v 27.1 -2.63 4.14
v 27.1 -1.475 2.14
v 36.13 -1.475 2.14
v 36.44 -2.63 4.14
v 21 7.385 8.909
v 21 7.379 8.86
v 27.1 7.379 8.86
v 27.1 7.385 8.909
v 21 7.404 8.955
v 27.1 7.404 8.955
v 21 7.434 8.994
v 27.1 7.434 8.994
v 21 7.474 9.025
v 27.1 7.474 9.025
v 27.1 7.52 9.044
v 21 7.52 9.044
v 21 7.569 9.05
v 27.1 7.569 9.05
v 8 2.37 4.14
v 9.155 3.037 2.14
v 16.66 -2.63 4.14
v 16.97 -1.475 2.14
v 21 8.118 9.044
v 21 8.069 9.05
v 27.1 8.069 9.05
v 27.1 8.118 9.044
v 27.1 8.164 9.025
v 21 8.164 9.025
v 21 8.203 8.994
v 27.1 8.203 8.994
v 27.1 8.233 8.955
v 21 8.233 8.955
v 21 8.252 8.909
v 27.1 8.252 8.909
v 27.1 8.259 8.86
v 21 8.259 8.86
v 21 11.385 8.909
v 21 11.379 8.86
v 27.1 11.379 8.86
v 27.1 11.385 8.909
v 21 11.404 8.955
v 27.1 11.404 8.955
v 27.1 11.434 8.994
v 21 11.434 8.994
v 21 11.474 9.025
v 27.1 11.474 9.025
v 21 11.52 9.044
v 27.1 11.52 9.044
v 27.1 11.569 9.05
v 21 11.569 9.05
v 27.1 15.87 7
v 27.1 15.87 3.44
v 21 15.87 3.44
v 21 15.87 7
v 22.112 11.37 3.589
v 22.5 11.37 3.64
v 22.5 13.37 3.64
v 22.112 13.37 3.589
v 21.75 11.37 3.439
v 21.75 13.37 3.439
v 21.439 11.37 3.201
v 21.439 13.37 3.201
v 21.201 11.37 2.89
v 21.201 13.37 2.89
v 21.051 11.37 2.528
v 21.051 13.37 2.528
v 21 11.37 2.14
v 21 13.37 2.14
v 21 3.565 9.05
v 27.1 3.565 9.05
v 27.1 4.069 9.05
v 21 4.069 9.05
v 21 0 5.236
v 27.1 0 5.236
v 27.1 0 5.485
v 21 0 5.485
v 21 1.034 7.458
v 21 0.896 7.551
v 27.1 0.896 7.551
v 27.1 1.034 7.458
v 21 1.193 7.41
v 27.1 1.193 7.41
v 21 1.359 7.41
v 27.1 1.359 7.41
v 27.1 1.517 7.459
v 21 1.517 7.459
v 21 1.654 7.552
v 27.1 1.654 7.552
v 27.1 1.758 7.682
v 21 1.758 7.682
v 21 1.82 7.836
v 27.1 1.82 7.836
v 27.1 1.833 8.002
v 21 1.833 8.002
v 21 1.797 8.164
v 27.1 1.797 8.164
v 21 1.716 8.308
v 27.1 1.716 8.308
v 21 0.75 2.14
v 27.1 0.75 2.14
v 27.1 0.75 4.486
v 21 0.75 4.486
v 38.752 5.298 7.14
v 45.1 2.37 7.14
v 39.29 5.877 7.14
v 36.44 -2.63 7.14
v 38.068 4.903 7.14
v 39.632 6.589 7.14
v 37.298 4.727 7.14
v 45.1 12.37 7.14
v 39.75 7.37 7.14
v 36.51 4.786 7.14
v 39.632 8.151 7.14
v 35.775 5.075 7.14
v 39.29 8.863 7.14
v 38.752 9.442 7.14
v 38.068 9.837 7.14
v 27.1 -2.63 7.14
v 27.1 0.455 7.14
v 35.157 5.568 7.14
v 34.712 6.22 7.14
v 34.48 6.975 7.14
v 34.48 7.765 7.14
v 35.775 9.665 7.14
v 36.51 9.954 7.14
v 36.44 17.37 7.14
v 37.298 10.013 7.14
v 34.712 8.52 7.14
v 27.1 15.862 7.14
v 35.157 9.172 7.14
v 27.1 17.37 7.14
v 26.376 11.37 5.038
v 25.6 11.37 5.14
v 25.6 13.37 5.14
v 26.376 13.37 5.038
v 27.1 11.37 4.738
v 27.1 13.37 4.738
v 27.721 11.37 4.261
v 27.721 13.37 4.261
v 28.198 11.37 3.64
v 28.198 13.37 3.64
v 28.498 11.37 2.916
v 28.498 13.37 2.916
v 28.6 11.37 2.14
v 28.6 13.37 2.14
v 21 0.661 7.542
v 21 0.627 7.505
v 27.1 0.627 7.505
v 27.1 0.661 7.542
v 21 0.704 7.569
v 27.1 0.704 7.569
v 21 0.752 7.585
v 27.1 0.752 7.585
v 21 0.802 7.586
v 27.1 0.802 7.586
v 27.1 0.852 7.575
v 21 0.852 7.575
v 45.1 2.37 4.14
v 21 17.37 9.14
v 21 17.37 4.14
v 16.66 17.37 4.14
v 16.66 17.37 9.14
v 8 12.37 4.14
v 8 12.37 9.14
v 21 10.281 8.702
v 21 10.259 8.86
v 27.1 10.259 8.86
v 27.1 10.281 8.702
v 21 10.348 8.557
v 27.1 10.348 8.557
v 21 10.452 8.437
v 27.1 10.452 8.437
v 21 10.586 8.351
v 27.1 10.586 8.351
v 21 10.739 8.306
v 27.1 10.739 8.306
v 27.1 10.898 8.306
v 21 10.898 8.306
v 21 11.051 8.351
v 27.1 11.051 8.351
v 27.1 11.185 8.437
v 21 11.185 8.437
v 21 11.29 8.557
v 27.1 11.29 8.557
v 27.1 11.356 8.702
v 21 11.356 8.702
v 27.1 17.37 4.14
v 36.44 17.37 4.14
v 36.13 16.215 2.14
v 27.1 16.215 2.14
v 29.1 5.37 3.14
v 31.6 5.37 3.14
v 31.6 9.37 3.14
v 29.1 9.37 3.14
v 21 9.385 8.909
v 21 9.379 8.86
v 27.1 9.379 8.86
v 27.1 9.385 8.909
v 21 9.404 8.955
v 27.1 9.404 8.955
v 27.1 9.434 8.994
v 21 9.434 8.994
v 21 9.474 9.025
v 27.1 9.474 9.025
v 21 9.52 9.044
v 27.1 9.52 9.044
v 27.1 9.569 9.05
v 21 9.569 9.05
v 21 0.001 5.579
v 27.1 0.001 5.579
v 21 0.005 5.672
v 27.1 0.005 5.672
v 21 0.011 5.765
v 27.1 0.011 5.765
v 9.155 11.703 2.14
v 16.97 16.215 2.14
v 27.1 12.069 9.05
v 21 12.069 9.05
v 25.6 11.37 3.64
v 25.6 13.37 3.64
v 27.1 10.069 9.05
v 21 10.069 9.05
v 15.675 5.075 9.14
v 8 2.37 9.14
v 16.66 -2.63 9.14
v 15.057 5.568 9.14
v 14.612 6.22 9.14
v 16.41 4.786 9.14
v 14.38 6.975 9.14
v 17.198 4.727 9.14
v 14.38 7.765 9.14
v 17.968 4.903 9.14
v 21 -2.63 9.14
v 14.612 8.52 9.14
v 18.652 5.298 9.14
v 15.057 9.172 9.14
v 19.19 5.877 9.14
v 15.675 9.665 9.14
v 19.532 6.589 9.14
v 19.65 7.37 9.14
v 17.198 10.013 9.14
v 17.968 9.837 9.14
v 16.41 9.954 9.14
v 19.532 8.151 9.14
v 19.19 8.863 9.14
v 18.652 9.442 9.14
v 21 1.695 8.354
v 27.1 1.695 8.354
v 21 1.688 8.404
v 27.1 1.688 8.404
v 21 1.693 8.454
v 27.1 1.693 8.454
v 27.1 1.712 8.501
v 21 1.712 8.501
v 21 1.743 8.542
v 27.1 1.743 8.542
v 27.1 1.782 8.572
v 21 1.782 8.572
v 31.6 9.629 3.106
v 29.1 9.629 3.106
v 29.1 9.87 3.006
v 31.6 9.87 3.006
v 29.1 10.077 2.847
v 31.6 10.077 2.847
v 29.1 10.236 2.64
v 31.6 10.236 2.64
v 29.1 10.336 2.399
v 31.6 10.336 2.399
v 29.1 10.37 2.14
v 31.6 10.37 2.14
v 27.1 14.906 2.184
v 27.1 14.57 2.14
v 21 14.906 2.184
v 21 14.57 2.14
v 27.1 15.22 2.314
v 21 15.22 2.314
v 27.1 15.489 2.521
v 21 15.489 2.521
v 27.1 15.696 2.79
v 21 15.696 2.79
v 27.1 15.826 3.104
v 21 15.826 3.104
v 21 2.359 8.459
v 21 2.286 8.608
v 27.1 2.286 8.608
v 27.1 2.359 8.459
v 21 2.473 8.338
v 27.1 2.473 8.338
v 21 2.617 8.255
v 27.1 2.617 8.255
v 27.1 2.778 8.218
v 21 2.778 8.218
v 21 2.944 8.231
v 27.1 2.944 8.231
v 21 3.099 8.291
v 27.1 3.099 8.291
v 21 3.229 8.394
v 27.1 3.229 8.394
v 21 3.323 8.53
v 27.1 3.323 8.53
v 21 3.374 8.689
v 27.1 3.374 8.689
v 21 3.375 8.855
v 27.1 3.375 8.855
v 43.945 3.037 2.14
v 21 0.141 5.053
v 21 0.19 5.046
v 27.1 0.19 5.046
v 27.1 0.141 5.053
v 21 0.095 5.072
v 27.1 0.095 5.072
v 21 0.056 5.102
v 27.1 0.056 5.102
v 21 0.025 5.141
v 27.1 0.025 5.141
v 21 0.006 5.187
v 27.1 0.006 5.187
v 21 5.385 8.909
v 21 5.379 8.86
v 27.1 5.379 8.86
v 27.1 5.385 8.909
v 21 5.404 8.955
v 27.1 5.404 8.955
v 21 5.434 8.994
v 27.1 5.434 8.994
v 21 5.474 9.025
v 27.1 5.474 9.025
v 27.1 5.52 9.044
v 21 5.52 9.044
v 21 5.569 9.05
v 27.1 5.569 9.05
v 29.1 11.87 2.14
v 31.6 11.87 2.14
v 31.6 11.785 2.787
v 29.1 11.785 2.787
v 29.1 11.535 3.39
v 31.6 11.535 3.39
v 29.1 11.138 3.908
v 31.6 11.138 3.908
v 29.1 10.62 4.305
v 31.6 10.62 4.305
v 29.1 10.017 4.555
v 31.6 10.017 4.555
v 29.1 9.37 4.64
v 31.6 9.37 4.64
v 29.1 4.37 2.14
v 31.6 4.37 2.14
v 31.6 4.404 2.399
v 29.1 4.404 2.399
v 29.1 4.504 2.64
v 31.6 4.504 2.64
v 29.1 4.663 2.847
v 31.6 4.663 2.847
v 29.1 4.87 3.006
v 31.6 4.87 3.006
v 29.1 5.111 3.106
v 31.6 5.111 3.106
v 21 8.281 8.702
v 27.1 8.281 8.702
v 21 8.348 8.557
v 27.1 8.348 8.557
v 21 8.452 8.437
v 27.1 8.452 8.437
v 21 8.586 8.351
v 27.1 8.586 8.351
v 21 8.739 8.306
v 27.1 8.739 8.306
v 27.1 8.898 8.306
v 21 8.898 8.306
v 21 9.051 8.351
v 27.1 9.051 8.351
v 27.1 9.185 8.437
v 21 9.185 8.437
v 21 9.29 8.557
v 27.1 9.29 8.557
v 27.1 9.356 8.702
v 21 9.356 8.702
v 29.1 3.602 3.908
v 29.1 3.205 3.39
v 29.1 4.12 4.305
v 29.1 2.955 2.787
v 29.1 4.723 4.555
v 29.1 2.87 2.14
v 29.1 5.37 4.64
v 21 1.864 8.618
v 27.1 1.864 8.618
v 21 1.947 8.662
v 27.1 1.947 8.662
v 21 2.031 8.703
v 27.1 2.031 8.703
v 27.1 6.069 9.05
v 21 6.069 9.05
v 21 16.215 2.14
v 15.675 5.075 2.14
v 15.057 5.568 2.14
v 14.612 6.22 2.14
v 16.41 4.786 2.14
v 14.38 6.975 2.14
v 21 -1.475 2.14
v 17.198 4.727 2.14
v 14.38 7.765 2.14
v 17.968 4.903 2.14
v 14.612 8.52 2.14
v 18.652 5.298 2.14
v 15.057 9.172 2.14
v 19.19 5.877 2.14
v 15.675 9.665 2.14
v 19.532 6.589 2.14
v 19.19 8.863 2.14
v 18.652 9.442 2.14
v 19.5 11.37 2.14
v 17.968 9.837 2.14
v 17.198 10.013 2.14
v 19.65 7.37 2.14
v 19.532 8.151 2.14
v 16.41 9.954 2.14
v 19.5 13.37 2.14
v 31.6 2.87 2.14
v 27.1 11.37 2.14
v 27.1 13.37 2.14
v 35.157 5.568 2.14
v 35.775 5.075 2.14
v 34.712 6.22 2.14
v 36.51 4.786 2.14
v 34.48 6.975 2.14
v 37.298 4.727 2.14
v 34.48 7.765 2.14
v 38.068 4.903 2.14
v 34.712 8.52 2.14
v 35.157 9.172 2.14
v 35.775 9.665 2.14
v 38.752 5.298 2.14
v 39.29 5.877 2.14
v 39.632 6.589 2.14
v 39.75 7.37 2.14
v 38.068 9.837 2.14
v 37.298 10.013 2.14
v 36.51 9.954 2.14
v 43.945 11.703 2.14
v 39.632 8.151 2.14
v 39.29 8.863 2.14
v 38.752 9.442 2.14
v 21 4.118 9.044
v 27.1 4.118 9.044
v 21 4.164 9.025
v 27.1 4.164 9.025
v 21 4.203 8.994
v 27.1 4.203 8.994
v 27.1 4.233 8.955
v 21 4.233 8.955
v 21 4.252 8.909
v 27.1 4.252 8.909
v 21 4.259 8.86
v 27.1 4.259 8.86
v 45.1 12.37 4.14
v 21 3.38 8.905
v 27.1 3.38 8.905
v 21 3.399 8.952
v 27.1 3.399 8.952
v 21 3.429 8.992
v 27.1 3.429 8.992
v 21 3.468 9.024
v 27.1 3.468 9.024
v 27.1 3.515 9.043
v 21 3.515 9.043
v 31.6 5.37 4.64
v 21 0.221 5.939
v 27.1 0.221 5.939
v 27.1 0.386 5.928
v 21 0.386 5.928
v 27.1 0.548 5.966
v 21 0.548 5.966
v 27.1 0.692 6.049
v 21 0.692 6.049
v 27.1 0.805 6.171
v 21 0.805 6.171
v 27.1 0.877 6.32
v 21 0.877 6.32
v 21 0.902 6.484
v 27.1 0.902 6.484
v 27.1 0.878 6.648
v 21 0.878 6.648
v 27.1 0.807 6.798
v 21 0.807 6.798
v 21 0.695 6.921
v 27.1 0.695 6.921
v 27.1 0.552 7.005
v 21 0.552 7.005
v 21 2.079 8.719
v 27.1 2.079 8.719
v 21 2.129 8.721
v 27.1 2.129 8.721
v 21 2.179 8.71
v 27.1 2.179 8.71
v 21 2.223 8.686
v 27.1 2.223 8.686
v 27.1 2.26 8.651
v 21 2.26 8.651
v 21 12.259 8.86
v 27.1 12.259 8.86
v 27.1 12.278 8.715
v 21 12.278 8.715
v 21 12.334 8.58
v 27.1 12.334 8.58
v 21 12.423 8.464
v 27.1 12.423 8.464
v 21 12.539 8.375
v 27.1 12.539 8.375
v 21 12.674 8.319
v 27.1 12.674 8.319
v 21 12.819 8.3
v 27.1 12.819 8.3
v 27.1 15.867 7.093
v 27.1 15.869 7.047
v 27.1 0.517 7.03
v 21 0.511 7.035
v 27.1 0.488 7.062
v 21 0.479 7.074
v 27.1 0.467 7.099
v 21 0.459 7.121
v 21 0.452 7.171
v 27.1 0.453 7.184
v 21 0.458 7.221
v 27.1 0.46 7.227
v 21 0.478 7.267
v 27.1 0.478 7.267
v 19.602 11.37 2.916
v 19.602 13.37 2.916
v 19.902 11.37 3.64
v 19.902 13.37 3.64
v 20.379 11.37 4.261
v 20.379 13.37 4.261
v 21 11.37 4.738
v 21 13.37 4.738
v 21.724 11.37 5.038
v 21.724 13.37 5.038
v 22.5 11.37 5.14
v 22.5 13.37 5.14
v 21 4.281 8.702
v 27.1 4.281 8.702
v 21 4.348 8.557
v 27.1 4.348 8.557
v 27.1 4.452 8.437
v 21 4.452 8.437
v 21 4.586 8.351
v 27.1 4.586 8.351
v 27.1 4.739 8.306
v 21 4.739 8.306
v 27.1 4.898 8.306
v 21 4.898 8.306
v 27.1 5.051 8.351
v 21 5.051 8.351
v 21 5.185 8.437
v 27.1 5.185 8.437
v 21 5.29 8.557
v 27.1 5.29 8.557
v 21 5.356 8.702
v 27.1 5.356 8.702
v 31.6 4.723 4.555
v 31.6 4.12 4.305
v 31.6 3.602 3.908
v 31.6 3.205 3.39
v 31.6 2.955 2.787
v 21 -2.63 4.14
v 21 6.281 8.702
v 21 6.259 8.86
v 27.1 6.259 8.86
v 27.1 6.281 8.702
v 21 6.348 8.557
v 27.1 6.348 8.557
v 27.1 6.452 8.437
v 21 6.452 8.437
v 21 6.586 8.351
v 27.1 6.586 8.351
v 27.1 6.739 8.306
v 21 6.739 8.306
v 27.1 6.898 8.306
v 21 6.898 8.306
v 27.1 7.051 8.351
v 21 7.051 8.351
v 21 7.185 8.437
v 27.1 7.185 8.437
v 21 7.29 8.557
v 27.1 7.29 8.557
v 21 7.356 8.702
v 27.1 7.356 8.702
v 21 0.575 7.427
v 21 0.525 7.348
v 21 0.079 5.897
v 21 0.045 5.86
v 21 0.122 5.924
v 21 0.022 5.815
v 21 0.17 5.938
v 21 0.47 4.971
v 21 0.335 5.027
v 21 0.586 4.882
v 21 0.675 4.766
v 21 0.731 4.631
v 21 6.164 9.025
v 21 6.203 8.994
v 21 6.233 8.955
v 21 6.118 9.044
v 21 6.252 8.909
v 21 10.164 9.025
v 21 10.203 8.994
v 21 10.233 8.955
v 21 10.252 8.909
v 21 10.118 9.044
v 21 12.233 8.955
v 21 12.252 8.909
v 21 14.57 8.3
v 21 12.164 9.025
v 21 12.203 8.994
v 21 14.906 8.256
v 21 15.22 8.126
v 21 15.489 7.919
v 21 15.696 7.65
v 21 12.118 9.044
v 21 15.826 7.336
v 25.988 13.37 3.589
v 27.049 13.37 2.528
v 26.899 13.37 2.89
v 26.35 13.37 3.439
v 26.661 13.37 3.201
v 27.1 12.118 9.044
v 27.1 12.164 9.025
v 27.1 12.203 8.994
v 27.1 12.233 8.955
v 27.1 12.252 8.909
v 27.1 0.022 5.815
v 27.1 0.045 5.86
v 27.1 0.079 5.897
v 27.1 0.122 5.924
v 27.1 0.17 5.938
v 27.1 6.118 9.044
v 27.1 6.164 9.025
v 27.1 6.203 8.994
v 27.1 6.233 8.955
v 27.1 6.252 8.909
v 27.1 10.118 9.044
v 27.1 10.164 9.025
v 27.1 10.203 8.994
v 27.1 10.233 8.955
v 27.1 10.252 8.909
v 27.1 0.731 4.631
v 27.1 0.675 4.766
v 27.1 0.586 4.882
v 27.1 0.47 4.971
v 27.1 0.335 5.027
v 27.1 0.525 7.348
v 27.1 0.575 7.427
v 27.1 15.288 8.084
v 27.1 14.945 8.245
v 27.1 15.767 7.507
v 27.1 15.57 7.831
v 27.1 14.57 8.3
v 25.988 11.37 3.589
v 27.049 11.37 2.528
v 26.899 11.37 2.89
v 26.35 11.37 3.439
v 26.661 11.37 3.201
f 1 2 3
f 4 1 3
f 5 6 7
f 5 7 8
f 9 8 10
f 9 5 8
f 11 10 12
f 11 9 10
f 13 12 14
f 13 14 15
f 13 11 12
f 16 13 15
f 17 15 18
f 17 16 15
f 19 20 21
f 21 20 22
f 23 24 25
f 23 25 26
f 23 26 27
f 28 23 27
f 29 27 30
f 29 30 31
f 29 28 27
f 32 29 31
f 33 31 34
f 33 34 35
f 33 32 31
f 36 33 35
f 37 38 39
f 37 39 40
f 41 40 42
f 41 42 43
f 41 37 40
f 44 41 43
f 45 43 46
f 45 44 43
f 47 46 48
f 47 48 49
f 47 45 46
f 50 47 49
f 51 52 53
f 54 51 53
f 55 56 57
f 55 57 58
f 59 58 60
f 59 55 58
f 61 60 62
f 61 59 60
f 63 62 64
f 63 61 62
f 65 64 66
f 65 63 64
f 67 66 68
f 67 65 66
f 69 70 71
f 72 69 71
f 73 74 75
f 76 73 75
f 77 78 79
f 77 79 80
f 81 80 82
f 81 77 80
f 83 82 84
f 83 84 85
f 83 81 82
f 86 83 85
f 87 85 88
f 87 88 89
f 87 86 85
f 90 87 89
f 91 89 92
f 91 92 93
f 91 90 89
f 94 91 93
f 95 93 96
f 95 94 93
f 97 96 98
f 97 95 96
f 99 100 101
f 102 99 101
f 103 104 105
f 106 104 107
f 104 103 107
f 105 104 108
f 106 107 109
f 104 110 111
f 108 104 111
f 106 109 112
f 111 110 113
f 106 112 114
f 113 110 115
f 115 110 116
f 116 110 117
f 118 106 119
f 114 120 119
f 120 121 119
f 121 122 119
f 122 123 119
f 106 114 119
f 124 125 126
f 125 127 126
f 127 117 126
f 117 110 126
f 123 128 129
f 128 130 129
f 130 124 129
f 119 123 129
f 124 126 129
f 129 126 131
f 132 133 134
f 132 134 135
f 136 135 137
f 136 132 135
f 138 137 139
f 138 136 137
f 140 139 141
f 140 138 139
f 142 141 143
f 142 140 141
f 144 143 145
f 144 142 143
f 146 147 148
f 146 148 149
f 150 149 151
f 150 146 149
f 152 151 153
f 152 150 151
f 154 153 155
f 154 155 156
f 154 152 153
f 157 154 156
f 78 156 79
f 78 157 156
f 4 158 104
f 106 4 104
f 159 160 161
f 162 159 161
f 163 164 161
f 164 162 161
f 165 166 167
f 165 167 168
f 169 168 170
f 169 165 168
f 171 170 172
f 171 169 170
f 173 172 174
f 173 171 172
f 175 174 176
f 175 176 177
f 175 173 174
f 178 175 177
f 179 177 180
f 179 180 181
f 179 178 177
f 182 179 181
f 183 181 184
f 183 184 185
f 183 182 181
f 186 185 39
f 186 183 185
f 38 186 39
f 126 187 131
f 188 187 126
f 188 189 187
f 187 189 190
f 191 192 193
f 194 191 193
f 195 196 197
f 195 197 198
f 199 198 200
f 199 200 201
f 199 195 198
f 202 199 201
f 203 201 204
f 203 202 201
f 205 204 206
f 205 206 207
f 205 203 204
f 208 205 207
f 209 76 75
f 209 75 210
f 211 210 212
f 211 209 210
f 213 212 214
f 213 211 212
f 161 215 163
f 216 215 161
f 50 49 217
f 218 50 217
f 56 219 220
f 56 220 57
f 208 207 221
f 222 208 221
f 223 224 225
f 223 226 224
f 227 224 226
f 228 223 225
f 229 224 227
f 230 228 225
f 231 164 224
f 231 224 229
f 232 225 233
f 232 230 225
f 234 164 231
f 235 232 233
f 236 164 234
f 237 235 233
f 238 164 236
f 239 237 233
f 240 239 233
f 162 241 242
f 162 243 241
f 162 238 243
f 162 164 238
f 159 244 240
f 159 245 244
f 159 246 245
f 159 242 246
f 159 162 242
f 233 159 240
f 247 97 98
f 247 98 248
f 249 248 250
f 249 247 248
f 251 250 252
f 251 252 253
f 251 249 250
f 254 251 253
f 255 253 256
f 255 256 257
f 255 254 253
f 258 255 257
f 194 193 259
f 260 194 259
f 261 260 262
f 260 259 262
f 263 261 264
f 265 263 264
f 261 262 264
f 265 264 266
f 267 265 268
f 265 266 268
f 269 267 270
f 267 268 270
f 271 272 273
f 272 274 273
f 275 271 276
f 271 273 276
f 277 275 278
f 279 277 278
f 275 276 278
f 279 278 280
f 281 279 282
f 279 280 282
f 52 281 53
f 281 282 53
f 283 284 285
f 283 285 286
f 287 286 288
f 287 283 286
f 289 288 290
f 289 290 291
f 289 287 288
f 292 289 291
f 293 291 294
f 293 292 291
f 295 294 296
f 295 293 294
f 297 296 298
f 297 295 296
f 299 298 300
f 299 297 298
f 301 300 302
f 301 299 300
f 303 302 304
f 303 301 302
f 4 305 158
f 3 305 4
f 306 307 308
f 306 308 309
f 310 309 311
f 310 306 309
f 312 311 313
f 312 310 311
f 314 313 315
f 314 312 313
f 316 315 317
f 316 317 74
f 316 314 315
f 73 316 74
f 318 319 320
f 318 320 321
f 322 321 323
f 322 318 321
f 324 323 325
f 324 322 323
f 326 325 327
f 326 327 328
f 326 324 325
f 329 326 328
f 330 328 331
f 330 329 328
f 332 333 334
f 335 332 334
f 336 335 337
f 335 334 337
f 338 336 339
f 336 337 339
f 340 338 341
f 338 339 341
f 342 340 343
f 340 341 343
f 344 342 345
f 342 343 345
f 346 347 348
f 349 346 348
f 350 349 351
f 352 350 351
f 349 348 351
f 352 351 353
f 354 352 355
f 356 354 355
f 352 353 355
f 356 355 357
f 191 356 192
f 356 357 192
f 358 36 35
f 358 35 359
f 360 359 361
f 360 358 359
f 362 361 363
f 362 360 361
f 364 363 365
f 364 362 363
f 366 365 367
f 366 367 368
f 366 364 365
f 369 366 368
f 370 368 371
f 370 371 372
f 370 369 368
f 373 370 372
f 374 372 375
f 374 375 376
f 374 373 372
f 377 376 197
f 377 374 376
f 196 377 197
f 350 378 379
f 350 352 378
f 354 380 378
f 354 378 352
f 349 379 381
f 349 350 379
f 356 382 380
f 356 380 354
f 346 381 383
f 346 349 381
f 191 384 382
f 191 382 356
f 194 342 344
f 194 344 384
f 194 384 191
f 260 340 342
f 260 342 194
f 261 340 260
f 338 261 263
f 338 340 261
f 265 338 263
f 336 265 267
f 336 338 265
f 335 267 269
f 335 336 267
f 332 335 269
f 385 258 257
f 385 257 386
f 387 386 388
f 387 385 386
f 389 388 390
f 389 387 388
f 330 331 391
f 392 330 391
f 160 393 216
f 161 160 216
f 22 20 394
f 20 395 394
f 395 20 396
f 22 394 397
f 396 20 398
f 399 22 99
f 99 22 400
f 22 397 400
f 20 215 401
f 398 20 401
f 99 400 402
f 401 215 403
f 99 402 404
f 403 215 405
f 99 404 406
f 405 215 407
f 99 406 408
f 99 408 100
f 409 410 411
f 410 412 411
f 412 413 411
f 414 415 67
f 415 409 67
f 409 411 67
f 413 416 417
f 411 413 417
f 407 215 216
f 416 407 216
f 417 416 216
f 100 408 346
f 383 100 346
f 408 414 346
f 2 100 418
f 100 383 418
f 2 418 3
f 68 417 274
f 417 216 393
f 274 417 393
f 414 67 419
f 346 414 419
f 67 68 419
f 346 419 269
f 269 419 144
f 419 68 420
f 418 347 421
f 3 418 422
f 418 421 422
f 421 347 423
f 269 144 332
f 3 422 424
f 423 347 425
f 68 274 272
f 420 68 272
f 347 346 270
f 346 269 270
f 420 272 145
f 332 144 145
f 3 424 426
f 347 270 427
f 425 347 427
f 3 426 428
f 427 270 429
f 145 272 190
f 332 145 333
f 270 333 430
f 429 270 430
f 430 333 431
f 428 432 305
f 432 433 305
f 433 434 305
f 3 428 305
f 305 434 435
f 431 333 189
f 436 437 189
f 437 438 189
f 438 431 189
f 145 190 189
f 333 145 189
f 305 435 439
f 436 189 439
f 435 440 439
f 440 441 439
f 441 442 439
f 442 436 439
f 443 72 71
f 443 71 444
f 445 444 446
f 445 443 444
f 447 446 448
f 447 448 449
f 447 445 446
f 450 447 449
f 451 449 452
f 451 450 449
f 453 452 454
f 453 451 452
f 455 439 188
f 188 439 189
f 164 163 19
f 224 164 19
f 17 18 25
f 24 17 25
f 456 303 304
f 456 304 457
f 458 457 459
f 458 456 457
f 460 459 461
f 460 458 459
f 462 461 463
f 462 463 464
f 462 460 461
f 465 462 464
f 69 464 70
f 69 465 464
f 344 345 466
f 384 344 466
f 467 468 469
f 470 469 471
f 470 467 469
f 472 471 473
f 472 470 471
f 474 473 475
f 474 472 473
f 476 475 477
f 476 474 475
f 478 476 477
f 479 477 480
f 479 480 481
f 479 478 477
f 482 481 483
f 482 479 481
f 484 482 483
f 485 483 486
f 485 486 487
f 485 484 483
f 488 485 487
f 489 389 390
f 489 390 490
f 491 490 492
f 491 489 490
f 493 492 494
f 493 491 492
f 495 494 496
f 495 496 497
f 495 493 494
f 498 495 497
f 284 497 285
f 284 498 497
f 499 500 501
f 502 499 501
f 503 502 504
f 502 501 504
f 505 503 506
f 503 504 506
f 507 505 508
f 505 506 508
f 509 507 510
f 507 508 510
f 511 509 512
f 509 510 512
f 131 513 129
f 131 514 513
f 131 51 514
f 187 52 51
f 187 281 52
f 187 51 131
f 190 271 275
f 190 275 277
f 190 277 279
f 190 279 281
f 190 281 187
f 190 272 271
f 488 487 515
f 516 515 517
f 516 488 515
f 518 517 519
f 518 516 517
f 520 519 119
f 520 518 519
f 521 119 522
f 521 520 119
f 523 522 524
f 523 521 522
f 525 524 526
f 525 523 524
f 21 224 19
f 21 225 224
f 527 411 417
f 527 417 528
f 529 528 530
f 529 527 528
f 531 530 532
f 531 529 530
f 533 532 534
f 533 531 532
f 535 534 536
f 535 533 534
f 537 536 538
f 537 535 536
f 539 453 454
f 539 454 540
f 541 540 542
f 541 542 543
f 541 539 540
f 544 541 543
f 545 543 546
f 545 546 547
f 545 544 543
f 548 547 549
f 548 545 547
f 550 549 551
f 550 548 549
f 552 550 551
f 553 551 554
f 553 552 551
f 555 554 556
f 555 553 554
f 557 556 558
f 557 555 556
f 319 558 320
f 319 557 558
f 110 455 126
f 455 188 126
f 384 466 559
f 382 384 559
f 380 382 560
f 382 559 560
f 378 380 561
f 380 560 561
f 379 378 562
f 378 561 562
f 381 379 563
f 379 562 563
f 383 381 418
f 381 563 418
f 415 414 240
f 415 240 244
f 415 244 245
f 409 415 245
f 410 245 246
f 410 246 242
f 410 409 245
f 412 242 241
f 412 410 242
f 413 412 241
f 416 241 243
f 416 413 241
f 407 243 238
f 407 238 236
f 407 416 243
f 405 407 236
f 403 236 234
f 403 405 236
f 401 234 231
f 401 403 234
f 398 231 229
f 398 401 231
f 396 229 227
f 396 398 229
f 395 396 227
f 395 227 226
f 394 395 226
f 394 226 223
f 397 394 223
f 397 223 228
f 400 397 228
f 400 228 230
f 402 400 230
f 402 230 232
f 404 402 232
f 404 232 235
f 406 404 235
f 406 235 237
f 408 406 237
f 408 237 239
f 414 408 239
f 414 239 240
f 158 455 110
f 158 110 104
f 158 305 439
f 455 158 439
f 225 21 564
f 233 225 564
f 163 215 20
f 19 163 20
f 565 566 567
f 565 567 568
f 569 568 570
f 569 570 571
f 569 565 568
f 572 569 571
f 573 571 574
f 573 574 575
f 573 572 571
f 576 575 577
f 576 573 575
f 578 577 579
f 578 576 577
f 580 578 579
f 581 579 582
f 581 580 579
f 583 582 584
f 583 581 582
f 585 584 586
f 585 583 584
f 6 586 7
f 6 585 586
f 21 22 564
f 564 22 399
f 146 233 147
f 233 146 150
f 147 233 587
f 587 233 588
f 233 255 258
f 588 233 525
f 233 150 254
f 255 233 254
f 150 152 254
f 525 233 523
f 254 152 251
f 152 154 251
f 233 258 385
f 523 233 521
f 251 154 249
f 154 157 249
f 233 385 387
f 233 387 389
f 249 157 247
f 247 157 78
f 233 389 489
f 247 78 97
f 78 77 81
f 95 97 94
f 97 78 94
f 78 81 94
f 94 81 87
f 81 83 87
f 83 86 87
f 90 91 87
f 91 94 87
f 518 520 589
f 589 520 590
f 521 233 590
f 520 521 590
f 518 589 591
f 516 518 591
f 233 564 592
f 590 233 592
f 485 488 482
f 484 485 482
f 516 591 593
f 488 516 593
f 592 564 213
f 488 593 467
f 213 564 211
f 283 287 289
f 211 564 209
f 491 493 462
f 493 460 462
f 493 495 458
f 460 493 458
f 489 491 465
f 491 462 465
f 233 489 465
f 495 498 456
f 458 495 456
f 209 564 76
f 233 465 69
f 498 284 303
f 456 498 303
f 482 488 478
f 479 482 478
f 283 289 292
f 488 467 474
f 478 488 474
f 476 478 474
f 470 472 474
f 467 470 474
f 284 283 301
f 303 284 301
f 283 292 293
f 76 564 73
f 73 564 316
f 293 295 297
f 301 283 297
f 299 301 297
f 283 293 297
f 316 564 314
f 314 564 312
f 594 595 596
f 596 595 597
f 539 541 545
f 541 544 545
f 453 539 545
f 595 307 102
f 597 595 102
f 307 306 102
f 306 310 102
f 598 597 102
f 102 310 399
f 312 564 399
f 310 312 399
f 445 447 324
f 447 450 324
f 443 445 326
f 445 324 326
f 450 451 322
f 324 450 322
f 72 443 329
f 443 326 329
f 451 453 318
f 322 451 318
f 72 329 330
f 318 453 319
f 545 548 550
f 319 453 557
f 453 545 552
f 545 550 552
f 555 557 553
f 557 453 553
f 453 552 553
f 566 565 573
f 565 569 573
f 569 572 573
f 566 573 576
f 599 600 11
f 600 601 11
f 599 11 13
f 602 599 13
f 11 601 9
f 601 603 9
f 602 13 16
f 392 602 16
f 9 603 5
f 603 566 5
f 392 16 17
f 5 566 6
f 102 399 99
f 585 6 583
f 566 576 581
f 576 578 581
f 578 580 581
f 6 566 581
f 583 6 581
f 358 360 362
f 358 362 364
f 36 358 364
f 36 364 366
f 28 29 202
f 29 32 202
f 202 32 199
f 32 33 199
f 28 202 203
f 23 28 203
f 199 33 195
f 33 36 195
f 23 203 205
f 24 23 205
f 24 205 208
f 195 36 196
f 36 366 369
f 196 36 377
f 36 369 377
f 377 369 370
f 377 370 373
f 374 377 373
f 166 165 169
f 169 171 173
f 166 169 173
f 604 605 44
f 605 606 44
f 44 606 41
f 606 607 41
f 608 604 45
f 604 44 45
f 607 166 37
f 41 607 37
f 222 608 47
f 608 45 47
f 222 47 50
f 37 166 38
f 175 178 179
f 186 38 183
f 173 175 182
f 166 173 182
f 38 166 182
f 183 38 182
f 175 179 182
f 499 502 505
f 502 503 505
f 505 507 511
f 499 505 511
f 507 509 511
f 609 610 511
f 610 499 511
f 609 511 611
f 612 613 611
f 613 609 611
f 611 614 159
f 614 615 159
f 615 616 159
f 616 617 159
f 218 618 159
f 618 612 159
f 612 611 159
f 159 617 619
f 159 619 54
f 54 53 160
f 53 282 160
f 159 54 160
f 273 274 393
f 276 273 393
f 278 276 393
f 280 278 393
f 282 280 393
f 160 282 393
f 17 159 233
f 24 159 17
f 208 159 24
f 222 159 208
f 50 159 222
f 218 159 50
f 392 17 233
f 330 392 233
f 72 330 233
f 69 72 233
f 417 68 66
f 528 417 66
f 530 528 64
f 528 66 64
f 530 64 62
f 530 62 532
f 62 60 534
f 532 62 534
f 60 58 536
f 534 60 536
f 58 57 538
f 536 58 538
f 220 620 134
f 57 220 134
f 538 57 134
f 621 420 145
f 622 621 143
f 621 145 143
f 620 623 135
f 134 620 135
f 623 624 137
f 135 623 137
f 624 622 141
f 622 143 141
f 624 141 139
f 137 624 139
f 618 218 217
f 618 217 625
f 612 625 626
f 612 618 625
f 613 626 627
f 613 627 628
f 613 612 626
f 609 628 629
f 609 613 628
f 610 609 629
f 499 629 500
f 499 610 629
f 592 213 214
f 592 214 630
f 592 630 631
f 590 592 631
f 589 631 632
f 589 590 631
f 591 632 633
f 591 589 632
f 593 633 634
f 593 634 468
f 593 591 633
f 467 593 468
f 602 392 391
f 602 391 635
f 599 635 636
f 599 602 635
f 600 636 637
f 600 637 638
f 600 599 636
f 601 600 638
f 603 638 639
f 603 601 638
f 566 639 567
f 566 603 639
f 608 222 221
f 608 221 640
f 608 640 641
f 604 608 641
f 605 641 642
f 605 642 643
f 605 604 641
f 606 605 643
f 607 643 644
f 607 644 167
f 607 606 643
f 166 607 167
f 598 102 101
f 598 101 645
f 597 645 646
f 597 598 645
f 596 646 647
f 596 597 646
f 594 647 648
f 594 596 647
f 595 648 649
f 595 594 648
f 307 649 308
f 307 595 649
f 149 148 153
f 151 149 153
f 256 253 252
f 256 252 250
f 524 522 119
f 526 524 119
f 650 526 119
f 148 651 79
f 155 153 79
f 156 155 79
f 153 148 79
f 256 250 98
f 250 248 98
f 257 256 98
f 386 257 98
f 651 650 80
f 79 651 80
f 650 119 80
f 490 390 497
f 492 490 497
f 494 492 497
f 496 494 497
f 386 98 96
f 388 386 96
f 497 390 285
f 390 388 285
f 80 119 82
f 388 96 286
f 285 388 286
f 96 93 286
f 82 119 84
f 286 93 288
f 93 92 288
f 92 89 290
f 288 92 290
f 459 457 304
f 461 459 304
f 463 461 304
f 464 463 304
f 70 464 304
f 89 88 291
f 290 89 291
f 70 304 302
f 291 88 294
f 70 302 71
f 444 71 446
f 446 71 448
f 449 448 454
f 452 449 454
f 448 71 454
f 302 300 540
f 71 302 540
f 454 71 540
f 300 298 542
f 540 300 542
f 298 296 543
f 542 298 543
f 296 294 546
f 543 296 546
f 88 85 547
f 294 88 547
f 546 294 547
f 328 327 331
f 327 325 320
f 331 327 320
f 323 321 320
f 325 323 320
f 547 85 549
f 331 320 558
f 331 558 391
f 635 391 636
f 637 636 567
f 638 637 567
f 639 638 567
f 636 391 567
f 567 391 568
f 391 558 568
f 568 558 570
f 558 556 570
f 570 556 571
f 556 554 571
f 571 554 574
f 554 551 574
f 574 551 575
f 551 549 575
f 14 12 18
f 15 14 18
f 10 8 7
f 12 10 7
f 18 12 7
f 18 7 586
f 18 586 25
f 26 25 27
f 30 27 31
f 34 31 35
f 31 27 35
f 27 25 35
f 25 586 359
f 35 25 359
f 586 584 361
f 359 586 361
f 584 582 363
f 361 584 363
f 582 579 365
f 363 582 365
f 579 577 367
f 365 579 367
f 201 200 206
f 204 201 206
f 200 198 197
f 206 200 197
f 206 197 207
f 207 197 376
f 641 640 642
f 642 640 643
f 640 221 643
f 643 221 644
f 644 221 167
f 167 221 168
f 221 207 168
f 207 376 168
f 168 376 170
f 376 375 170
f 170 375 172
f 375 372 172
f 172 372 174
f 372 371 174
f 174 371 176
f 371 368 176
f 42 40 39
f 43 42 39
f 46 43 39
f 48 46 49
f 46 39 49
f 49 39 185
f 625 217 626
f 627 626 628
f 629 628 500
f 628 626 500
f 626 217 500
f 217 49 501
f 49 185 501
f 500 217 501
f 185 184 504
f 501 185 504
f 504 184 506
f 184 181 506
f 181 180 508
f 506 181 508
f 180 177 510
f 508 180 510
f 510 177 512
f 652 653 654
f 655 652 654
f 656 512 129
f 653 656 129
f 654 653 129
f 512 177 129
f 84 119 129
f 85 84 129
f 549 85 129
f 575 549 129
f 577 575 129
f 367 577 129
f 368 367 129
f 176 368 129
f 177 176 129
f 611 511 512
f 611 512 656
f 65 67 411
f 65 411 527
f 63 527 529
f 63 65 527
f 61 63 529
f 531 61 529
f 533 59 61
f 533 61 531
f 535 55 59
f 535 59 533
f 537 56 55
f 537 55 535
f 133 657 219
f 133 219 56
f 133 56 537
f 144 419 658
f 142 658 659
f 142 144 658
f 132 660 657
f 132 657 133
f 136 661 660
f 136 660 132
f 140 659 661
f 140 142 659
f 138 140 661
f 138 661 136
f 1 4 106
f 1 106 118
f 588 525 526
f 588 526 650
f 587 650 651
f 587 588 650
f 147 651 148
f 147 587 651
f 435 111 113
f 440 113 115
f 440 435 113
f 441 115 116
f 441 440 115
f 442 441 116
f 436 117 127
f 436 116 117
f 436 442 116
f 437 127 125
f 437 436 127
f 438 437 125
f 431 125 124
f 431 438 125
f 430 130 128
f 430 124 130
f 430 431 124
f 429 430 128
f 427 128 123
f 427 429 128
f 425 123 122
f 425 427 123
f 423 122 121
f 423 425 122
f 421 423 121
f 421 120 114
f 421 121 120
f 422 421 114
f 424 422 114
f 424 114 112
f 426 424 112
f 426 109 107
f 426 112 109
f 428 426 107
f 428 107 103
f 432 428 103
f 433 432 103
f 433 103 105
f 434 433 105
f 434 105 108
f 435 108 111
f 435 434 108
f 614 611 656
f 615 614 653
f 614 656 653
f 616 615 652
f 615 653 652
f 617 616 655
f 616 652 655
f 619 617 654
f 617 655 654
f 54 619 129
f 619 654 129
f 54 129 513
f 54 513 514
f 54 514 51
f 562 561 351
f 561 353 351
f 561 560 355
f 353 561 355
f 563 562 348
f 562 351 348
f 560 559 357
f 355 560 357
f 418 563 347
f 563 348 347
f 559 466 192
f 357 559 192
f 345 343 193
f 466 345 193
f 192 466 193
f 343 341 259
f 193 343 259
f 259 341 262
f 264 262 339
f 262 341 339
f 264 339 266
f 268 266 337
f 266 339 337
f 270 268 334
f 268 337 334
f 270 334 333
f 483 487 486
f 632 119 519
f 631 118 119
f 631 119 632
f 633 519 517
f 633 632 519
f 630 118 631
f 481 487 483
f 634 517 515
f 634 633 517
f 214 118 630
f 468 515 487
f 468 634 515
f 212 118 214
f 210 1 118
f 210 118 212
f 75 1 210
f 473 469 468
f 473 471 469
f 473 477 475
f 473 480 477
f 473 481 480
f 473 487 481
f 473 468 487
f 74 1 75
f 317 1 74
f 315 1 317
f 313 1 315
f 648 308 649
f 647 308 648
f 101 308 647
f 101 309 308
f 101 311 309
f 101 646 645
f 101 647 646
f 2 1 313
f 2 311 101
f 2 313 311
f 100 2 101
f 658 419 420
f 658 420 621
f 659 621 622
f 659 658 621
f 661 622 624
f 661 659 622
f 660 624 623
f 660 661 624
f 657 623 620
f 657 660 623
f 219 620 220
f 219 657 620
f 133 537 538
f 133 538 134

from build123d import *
from OCP.BRepFilletAPI import BRepFilletAPI_MakeChamfer

# Parameters (mm, degrees)
AUFSATZ_LINEAR_AUSTRAGEN1_DEPTH    = 6.1
SKIZZE1_W                          = 6
SKIZZE1_H                          = 15
AUFSATZ_LINEAR_AUSTRAGEN1_2_DEPTH  = 6.1
SKIZZE2_W                          = 6
SKIZZE2_H                          = 15
SCHNITT_LINEAR_AUSTRAGEN1_DEPTH    = 6.1
SKIZZE3_R                          = 2.65
AUFSATZ_LINEAR_AUSTRAGEN2_DEPTH    = 2.19
SCHNITT_LINEAR_AUSTRAGEN7_DEPTH    = 6.1
AUFSATZ_LINEAR_START               = 4.81
SKIZZE4_R                          = 2.65
AUFSATZ_LINEAR_AUSTRAGEN3_DEPTH    = 4.81
SKIZZE5_R                          = 2.65
AUFSATZ_LINEAR_AUSTRAGEN4_DEPTH    = 0.19
FASE1_SIZE                         = 5
FASE1_SIZE2                        = 8.660254038
FASE2_SIZE                         = 2
FASE2_SIZE2                        = 1.154700538
SCHNITT_LINEAR_START               = -14
SCHNITT_LINEAR_AUSTRAGEN8_DEPTH    = 2
SCHNITT_LINEAR_START_2             = -13.5
SCHNITT_LINEAR_AUSTRAGEN5_DEPTH    = 2.5
VERRUNDUNG1_R                      = 1.3
K_RPER_VERSCHIEBEN_KOPIEREN1_ANGLE = 90


with BuildPart() as part:
    # Skizze1 → Aufsatz-Linear austragen1 (new body)
    with BuildSketch(Plane.XY):
        with BuildLine():
            Line((-7.050000002, 7.568775844), (-7.050000002, 8.068775844))
            ThreePointArc((-7.050000002, 8.068775844), (-7.105649713, 8.203126132), (-7.240000002, 8.258775844))
            ThreePointArc((-7.240000002, 8.258775844), (-7.800000002, 8.818775844), (-7.240000002, 9.378775844))
            ThreePointArc((-7.240000002, 9.378775844), (-7.105649713, 9.434425555), (-7.050000002, 9.568775844))
            Line((-7.050000002, 9.568775844), (-7.050000002, 10.068775844))
            ThreePointArc((-7.050000002, 10.068775844), (-7.105649713, 10.203126132), (-7.240000002, 10.258775844))
            ThreePointArc((-7.240000002, 10.258775844), (-7.800000002, 10.818775844), (-7.240000002, 11.378775844))
            ThreePointArc((-7.240000002, 11.378775844), (-7.105649713, 11.434425555), (-7.050000002, 11.568775844))
            Line((-7.050000002, 11.568775844), (-7.050000002, 12.068775844))
            ThreePointArc((-7.050000002, 12.068775844), (-7.105649713, 12.203126132), (-7.240000002, 12.258775843))
            Line((-7.240000002, 12.258775843), (-9.150000002, 12.258775843))
            Line((-9.150000002, 12.258775843), (-9.150000002, 4))
            Line((-9.150000002, 4), (-10.615000002, 4))
            Line((-10.615000002, 4), (-13.960000002, 4))
            Line((-13.960000002, 4), (-13.960000002, 0.75))
            Line((-13.960000002, 0.75), (-11.613821225, 0.75))
            ThreePointArc((-11.613821225, 0.75), (-11.217841428, 0.585979797), (-11.053821225, 0.19))
            ThreePointArc((-11.053821225, 0.19), (-10.998171513, 0.055649712), (-10.863821225, 0))
            Line((-10.863821225, 0), (-10.615000002, 0))
            ThreePointArc((-10.615000002, 0), (-10.474650873, 0.002763747), (-10.334519354, 0.011050703))
            ThreePointArc((-10.334519354, 0.011050703), (-10.203241743, 0.079144265), (-10.160552613, 0.22073587))
            ThreePointArc((-10.160552613, 0.22073587), (-9.779942741, 0.876709768), (-9.094653704, 0.551833537))
            ThreePointArc((-9.094653704, 0.551833537), (-8.979253962, 0.459348706), (-8.832500002, 0.477619436))
            ThreePointArc((-8.832500002, 0.477619436), (-8.712335964, 0.550187475), (-8.595121987, 0.627429949))
            ThreePointArc((-8.595121987, 0.627429949), (-8.515479022, 0.752039509), (-8.549304953, 0.896006001))
            ThreePointArc((-8.549304953, 0.896006001), (-8.547674084, 1.654400997), (-7.791758254, 1.715694446))
            ThreePointArc((-7.791758254, 1.715694446), (-7.64557673, 1.693300104), (-7.527619437, 1.7825))
            ThreePointArc((-7.527619437, 1.7825), (-7.459838348, 1.905427785), (-7.396949303, 2.030928718))
            ThreePointArc((-7.396949303, 2.030928718), (-7.390281252, 2.178665245), (-7.491558614, 2.286430919))
            ThreePointArc((-7.491558614, 2.286430919), (-7.869343738, 2.944035686), (-7.24534815, 3.375075285))
            ThreePointArc((-7.24534815, 3.375075285), (-7.107554066, 3.428771978), (-7.050000002, 3.565))
            Line((-7.050000002, 3.565), (-7.050000002, 4.068775844))
            ThreePointArc((-7.050000002, 4.068775844), (-7.105649713, 4.203126132), (-7.240000002, 4.258775844))
            ThreePointArc((-7.240000002, 4.258775844), (-7.800000002, 4.818775844), (-7.240000002, 5.378775844))
            ThreePointArc((-7.240000002, 5.378775844), (-7.105649713, 5.434425555), (-7.050000002, 5.568775844))
            Line((-7.050000002, 5.568775844), (-7.050000002, 6.068775844))
            ThreePointArc((-7.050000002, 6.068775844), (-7.105649713, 6.203126132), (-7.240000002, 6.258775844))
            ThreePointArc((-7.240000002, 6.258775844), (-7.800000002, 6.818775844), (-7.240000002, 7.378775844))
            ThreePointArc((-7.240000002, 7.378775844), (-7.105649713, 7.434425555), (-7.050000002, 7.568775844))
        make_face()
    extrude(amount=AUFSATZ_LINEAR_AUSTRAGEN1_DEPTH)

    # Skizze3 → Aufsatz-Linear austragen2 (add)
    with BuildSketch(Plane.ZY.offset(9.150000002)):
        Polygon((6.1, 12.258775843), (6.1, 15.87), (0, 15.87), (0, 17.37), (-13, 17.37), (-13, -2.63), (0, -2.63), (0, 12.258775843), align=None)
        with Locations((-4, 7.37)):
            Circle(SKIZZE3_R, mode=Mode.SUBTRACT)
    extrude(amount=-AUFSATZ_LINEAR_AUSTRAGEN2_DEPTH)

    # Skizze15 → Schnitt-Linear austragen7 (cut)
    with BuildSketch(Plane.XY.offset(6.1)):
        with BuildLine():
            Line((-7.800000002, 12.818775843), (-7.800000002, 14.57))
            ThreePointArc((-7.800000002, 14.57), (-8.180761186, 15.489238816), (-9.100000002, 15.87))
            Line((-9.100000002, 15.87), (-6.960000002, 15.87))
            Line((-6.960000002, 15.87), (-6.960000002, 12.258775843))
            Line((-6.960000002, 12.258775843), (-7.240000002, 12.258775843))
            ThreePointArc((-7.240000002, 12.258775843), (-7.635979799, 12.422796046), (-7.800000002, 12.818775843))
        make_face()
    extrude(amount=-SCHNITT_LINEAR_AUSTRAGEN7_DEPTH, mode=Mode.SUBTRACT)

    # Skizze4 → Aufsatz-Linear austragen3 (add)
    with BuildSketch(Plane.ZY.offset(9.150000002).offset(AUFSATZ_LINEAR_START)):
        Polygon((6.1, 17.37), (6.1, 15.87), (0, 15.87), (0, 17.37), (-13, 17.37), (-13, -2.63), (0, -2.63), (0, 4), (6.1, 4), (6.1, -2.63), (24.1, -2.63), (24.1, 17.37), align=None)
        with Locations((16.1, 7.37)):
            Circle(SKIZZE4_R, mode=Mode.SUBTRACT)
        with Locations((-4, 7.37)):
            Circle(SKIZZE4_R, mode=Mode.SUBTRACT)
    extrude(amount=-AUFSATZ_LINEAR_AUSTRAGEN3_DEPTH)

    # Skizze5 → Aufsatz-Linear austragen4 (add)
    with BuildSketch(Plane(origin=(-9.150000002, 0, 0), x_dir=(0, 0, -1), z_dir=(1, 0, 0))):
        Polygon((-6.1, 17.37), (-24.1, 17.37), (-24.1, -2.63), (-6.1, -2.63), (-6.1, 0.655715781), (-6.1, 15.87), align=None)
        with Locations(Location((-16.1, 7.37, 0), (0, 0, 180))):
            Circle(SKIZZE5_R, mode=Mode.SUBTRACT)
    extrude(amount=AUFSATZ_LINEAR_AUSTRAGEN4_DEPTH)

    # Fase1: one chamfer whose edges measure the first distance from different faces: ONE call of the kernel's chamfer builder (chamfer() names one face for all edges)
    fase1_edges_1 = [part.edges().sort_by_distance(p)[0] for p in [
        (-10.460000002, -2.63, -13),
        (-10.460000002, 17.37, -13),
    ]]
    fase1_side_1 = [part.faces().sort_by_distance(p)[0] for p in [
        (-10.460000002, 7.37, -13),
    ]]
    fase1_edges_2 = [part.edges().sort_by_distance(p)[0] for p in [
        (-11.460000002, 17.37, 24.1),
        (-11.460000002, -2.63, 24.1),
    ]]
    fase1_side_2 = [part.faces().sort_by_distance(p)[0] for p in [
        (-11.460000002, 7.37, 24.1),
    ]]
    fase1 = BRepFilletAPI_MakeChamfer(part.part.solid().wrapped)
    for e in fase1_edges_1:
        fase1.Add(FASE1_SIZE, FASE1_SIZE2, e.wrapped, fase1_side_1[0].wrapped)  # the first distance lies on this face
    for e in fase1_edges_2:
        fase1.Add(FASE1_SIZE, FASE1_SIZE2, e.wrapped, fase1_side_2[0].wrapped)  # the first distance lies on this face
    add(Compound.cast(fase1.Shape()), mode=Mode.REPLACE)

    # Fase2: one chamfer whose edges measure the first distance from different faces: ONE call of the kernel's chamfer builder (chamfer() names one face for all edges)
    fase2_edges_1 = [part.edges().sort_by_distance(p)[0] for p in [
        (-13.960000002, 17.37, 10.769872981),
    ]]
    fase2_side_1 = [part.faces().sort_by_distance(p)[0] for p in [
        (-11.460000002, 17.37, 10.769872981),
    ]]
    fase2_edges_2 = [part.edges().sort_by_distance(p)[0] for p in [
        (-13.960000002, 17.37, -2.169872981),
    ]]
    fase2_side_2 = [part.faces().sort_by_distance(p)[0] for p in [
        (-10.460000002, 17.37, -2.169872981),
    ]]
    fase2_edges_3 = [part.edges().sort_by_distance(p)[0] for p in [
        (-13.960000002, -2.63, 10.769872981),
    ]]
    fase2_side_3 = [part.faces().sort_by_distance(p)[0] for p in [
        (-11.460000002, -2.63, 10.769872981),
    ]]
    fase2_edges_4 = [part.edges().sort_by_distance(p)[0] for p in [
        (-13.960000002, 7.37, 24.1),
    ]]
    fase2_side_4 = [part.faces().sort_by_distance(p)[0] for p in [
        (-11.460000002, 7.37, 24.1),
    ]]
    fase2_edges_5 = [part.edges().sort_by_distance(p)[0] for p in [
        (-13.960000002, 7.37, -13),
    ]]
    fase2_side_5 = [part.faces().sort_by_distance(p)[0] for p in [
        (-10.460000002, 7.37, -13),
    ]]
    fase2_edges_6 = [part.edges().sort_by_distance(p)[0] for p in [
        (-13.960000002, -2.63, -2.169872981),
    ]]
    fase2_side_6 = [part.faces().sort_by_distance(p)[0] for p in [
        (-10.460000002, -2.63, -2.169872981),
    ]]
    fase2_edges_7 = [part.edges().sort_by_distance(p)[0] for p in [
        (-13.960000002, -0.13, -8.669872981),
    ]]
    fase2_side_7 = [part.faces().sort_by_distance(p)[0] for p in [
        (-10.460000002, -0.13, -8.669872981),
    ]]
    fase2_edges_8 = [part.edges().sort_by_distance(p)[0] for p in [
        (-13.960000002, -0.13, 19.769872981),
    ]]
    fase2_side_8 = [part.faces().sort_by_distance(p)[0] for p in [
        (-11.460000002, -0.13, 19.769872981),
    ]]
    fase2_edges_9 = [part.edges().sort_by_distance(p)[0] for p in [
        (-13.960000002, 14.87, -8.669872981),
    ]]
    fase2_side_9 = [part.faces().sort_by_distance(p)[0] for p in [
        (-10.460000002, 14.87, -8.669872981),
    ]]
    fase2_edges_10 = [part.edges().sort_by_distance(p)[0] for p in [
        (-13.960000002, 14.87, 19.769872981),
    ]]
    fase2_side_10 = [part.faces().sort_by_distance(p)[0] for p in [
        (-11.460000002, 14.87, 19.769872981),
    ]]
    fase2 = BRepFilletAPI_MakeChamfer(part.part.solid().wrapped)
    for e in fase2_edges_1:
        fase2.Add(FASE2_SIZE, FASE2_SIZE2, e.wrapped, fase2_side_1[0].wrapped)  # the first distance lies on this face
    for e in fase2_edges_2:
        fase2.Add(FASE2_SIZE, FASE2_SIZE2, e.wrapped, fase2_side_2[0].wrapped)  # the first distance lies on this face
    for e in fase2_edges_3:
        fase2.Add(FASE2_SIZE, FASE2_SIZE2, e.wrapped, fase2_side_3[0].wrapped)  # the first distance lies on this face
    for e in fase2_edges_4:
        fase2.Add(FASE2_SIZE, FASE2_SIZE2, e.wrapped, fase2_side_4[0].wrapped)  # the first distance lies on this face
    for e in fase2_edges_5:
        fase2.Add(FASE2_SIZE, FASE2_SIZE2, e.wrapped, fase2_side_5[0].wrapped)  # the first distance lies on this face
    for e in fase2_edges_6:
        fase2.Add(FASE2_SIZE, FASE2_SIZE2, e.wrapped, fase2_side_6[0].wrapped)  # the first distance lies on this face
    for e in fase2_edges_7:
        fase2.Add(FASE2_SIZE, FASE2_SIZE2, e.wrapped, fase2_side_7[0].wrapped)  # the first distance lies on this face
    for e in fase2_edges_8:
        fase2.Add(FASE2_SIZE, FASE2_SIZE2, e.wrapped, fase2_side_8[0].wrapped)  # the first distance lies on this face
    for e in fase2_edges_9:
        fase2.Add(FASE2_SIZE, FASE2_SIZE2, e.wrapped, fase2_side_9[0].wrapped)  # the first distance lies on this face
    for e in fase2_edges_10:
        fase2.Add(FASE2_SIZE, FASE2_SIZE2, e.wrapped, fase2_side_10[0].wrapped)  # the first distance lies on this face
    add(Compound.cast(fase2.Shape()), mode=Mode.REPLACE)

    # Skizze11 → Schnitt-Linear austragen8 (cut)
    with BuildSketch(Plane.XZ.offset(2.63).offset(SCHNITT_LINEAR_START)):
        with BuildLine():
            Line((-13.960000002, 7.6), (-13.960000002, 6.1))
            ThreePointArc((-13.960000002, 6.1), (-12.89933983, 5.660660172), (-12.460000002, 4.6))
            Line((-12.460000002, 4.6), (-12.460000002, 1.5))
            ThreePointArc((-12.460000002, 1.5), (-12.89933983, 0.439339828), (-13.960000002, 0))
            Line((-13.960000002, 0), (-13.960000002, -1.5))
            ThreePointArc((-13.960000002, -1.5), (-11.838679658, -0.621320344), (-10.960000002, 1.5))
            Line((-10.960000002, 1.5), (-10.960000002, 4.6))
            ThreePointArc((-10.960000002, 4.6), (-11.838679658, 6.721320344), (-13.960000002, 7.6))
        make_face()
    extrude(amount=-SCHNITT_LINEAR_AUSTRAGEN8_DEPTH, mode=Mode.SUBTRACT)

    # Skizze13 → Schnitt-Linear austragen5 (cut)
    with BuildSketch(Plane.XY.offset(24.1).offset(SCHNITT_LINEAR_START_2)):
        with BuildLine():
            Line((-12.960000002, 5.37), (-12.960000002, 9.37))
            ThreePointArc((-12.960000002, 9.37), (-13.252893221, 10.077106781), (-13.960000002, 10.37))
            Line((-13.960000002, 10.37), (-13.960000002, 11.87))
            ThreePointArc((-13.960000002, 11.87), (-12.192233049, 11.137766953), (-11.460000002, 9.37))
            Line((-11.460000002, 9.37), (-11.460000002, 5.37))
            ThreePointArc((-11.460000002, 5.37), (-12.192233049, 3.602233047), (-13.960000002, 2.87))
            Line((-13.960000002, 2.87), (-13.960000002, 4.37))
            ThreePointArc((-13.960000002, 4.37), (-13.252893221, 4.662893219), (-12.960000002, 5.37))
        make_face()
    extrude(amount=-SCHNITT_LINEAR_AUSTRAGEN5_DEPTH, mode=Mode.SUBTRACT)

    # Verrundung1
    verrundung1_edges = [part.edges().sort_by_distance(p)[0] for p in [
        (-13.960000002, 15.87, 3.05),
    ]]
    fillet(verrundung1_edges, radius=VERRUNDUNG1_R)


with BuildPart() as body_2:
    # Skizze1 → Aufsatz-Linear austragen1 2 (new body)
    with BuildSketch(Plane.XY):
        with Locations((-3, 7.5)):
            Rectangle(SKIZZE1_W, SKIZZE1_H)
    extrude(amount=AUFSATZ_LINEAR_AUSTRAGEN1_2_DEPTH)

    # Skizze2 → Schnitt-Linear austragen1 (cut)
    with BuildSketch(Plane.XY.offset(6.1)):
        with Locations((-3, 7.5)):
            Rectangle(SKIZZE2_W, SKIZZE2_H)
    extrude(amount=-SCHNITT_LINEAR_AUSTRAGEN1_DEPTH, mode=Mode.SUBTRACT)


with BuildPart() as body_2_2:
    # Spiegeln1: mirrored copy
    add(part.part.mirror(Plane(origin=(-6.960000002, -14.282117533, -13), x_dir=(1, 0, 0), z_dir=(0, 0, 1))))


with BuildPart() as body_2_2_1:
    # Körper-Verschieben/Kopieren1: moved
    add(body_2_2.part.rotate(Axis((-10.55, 0, 5.55), (0, -1, 0)), K_RPER_VERSCHIEBEN_KOPIEREN1_ANGLE))


solid = body_2_2_1.part
